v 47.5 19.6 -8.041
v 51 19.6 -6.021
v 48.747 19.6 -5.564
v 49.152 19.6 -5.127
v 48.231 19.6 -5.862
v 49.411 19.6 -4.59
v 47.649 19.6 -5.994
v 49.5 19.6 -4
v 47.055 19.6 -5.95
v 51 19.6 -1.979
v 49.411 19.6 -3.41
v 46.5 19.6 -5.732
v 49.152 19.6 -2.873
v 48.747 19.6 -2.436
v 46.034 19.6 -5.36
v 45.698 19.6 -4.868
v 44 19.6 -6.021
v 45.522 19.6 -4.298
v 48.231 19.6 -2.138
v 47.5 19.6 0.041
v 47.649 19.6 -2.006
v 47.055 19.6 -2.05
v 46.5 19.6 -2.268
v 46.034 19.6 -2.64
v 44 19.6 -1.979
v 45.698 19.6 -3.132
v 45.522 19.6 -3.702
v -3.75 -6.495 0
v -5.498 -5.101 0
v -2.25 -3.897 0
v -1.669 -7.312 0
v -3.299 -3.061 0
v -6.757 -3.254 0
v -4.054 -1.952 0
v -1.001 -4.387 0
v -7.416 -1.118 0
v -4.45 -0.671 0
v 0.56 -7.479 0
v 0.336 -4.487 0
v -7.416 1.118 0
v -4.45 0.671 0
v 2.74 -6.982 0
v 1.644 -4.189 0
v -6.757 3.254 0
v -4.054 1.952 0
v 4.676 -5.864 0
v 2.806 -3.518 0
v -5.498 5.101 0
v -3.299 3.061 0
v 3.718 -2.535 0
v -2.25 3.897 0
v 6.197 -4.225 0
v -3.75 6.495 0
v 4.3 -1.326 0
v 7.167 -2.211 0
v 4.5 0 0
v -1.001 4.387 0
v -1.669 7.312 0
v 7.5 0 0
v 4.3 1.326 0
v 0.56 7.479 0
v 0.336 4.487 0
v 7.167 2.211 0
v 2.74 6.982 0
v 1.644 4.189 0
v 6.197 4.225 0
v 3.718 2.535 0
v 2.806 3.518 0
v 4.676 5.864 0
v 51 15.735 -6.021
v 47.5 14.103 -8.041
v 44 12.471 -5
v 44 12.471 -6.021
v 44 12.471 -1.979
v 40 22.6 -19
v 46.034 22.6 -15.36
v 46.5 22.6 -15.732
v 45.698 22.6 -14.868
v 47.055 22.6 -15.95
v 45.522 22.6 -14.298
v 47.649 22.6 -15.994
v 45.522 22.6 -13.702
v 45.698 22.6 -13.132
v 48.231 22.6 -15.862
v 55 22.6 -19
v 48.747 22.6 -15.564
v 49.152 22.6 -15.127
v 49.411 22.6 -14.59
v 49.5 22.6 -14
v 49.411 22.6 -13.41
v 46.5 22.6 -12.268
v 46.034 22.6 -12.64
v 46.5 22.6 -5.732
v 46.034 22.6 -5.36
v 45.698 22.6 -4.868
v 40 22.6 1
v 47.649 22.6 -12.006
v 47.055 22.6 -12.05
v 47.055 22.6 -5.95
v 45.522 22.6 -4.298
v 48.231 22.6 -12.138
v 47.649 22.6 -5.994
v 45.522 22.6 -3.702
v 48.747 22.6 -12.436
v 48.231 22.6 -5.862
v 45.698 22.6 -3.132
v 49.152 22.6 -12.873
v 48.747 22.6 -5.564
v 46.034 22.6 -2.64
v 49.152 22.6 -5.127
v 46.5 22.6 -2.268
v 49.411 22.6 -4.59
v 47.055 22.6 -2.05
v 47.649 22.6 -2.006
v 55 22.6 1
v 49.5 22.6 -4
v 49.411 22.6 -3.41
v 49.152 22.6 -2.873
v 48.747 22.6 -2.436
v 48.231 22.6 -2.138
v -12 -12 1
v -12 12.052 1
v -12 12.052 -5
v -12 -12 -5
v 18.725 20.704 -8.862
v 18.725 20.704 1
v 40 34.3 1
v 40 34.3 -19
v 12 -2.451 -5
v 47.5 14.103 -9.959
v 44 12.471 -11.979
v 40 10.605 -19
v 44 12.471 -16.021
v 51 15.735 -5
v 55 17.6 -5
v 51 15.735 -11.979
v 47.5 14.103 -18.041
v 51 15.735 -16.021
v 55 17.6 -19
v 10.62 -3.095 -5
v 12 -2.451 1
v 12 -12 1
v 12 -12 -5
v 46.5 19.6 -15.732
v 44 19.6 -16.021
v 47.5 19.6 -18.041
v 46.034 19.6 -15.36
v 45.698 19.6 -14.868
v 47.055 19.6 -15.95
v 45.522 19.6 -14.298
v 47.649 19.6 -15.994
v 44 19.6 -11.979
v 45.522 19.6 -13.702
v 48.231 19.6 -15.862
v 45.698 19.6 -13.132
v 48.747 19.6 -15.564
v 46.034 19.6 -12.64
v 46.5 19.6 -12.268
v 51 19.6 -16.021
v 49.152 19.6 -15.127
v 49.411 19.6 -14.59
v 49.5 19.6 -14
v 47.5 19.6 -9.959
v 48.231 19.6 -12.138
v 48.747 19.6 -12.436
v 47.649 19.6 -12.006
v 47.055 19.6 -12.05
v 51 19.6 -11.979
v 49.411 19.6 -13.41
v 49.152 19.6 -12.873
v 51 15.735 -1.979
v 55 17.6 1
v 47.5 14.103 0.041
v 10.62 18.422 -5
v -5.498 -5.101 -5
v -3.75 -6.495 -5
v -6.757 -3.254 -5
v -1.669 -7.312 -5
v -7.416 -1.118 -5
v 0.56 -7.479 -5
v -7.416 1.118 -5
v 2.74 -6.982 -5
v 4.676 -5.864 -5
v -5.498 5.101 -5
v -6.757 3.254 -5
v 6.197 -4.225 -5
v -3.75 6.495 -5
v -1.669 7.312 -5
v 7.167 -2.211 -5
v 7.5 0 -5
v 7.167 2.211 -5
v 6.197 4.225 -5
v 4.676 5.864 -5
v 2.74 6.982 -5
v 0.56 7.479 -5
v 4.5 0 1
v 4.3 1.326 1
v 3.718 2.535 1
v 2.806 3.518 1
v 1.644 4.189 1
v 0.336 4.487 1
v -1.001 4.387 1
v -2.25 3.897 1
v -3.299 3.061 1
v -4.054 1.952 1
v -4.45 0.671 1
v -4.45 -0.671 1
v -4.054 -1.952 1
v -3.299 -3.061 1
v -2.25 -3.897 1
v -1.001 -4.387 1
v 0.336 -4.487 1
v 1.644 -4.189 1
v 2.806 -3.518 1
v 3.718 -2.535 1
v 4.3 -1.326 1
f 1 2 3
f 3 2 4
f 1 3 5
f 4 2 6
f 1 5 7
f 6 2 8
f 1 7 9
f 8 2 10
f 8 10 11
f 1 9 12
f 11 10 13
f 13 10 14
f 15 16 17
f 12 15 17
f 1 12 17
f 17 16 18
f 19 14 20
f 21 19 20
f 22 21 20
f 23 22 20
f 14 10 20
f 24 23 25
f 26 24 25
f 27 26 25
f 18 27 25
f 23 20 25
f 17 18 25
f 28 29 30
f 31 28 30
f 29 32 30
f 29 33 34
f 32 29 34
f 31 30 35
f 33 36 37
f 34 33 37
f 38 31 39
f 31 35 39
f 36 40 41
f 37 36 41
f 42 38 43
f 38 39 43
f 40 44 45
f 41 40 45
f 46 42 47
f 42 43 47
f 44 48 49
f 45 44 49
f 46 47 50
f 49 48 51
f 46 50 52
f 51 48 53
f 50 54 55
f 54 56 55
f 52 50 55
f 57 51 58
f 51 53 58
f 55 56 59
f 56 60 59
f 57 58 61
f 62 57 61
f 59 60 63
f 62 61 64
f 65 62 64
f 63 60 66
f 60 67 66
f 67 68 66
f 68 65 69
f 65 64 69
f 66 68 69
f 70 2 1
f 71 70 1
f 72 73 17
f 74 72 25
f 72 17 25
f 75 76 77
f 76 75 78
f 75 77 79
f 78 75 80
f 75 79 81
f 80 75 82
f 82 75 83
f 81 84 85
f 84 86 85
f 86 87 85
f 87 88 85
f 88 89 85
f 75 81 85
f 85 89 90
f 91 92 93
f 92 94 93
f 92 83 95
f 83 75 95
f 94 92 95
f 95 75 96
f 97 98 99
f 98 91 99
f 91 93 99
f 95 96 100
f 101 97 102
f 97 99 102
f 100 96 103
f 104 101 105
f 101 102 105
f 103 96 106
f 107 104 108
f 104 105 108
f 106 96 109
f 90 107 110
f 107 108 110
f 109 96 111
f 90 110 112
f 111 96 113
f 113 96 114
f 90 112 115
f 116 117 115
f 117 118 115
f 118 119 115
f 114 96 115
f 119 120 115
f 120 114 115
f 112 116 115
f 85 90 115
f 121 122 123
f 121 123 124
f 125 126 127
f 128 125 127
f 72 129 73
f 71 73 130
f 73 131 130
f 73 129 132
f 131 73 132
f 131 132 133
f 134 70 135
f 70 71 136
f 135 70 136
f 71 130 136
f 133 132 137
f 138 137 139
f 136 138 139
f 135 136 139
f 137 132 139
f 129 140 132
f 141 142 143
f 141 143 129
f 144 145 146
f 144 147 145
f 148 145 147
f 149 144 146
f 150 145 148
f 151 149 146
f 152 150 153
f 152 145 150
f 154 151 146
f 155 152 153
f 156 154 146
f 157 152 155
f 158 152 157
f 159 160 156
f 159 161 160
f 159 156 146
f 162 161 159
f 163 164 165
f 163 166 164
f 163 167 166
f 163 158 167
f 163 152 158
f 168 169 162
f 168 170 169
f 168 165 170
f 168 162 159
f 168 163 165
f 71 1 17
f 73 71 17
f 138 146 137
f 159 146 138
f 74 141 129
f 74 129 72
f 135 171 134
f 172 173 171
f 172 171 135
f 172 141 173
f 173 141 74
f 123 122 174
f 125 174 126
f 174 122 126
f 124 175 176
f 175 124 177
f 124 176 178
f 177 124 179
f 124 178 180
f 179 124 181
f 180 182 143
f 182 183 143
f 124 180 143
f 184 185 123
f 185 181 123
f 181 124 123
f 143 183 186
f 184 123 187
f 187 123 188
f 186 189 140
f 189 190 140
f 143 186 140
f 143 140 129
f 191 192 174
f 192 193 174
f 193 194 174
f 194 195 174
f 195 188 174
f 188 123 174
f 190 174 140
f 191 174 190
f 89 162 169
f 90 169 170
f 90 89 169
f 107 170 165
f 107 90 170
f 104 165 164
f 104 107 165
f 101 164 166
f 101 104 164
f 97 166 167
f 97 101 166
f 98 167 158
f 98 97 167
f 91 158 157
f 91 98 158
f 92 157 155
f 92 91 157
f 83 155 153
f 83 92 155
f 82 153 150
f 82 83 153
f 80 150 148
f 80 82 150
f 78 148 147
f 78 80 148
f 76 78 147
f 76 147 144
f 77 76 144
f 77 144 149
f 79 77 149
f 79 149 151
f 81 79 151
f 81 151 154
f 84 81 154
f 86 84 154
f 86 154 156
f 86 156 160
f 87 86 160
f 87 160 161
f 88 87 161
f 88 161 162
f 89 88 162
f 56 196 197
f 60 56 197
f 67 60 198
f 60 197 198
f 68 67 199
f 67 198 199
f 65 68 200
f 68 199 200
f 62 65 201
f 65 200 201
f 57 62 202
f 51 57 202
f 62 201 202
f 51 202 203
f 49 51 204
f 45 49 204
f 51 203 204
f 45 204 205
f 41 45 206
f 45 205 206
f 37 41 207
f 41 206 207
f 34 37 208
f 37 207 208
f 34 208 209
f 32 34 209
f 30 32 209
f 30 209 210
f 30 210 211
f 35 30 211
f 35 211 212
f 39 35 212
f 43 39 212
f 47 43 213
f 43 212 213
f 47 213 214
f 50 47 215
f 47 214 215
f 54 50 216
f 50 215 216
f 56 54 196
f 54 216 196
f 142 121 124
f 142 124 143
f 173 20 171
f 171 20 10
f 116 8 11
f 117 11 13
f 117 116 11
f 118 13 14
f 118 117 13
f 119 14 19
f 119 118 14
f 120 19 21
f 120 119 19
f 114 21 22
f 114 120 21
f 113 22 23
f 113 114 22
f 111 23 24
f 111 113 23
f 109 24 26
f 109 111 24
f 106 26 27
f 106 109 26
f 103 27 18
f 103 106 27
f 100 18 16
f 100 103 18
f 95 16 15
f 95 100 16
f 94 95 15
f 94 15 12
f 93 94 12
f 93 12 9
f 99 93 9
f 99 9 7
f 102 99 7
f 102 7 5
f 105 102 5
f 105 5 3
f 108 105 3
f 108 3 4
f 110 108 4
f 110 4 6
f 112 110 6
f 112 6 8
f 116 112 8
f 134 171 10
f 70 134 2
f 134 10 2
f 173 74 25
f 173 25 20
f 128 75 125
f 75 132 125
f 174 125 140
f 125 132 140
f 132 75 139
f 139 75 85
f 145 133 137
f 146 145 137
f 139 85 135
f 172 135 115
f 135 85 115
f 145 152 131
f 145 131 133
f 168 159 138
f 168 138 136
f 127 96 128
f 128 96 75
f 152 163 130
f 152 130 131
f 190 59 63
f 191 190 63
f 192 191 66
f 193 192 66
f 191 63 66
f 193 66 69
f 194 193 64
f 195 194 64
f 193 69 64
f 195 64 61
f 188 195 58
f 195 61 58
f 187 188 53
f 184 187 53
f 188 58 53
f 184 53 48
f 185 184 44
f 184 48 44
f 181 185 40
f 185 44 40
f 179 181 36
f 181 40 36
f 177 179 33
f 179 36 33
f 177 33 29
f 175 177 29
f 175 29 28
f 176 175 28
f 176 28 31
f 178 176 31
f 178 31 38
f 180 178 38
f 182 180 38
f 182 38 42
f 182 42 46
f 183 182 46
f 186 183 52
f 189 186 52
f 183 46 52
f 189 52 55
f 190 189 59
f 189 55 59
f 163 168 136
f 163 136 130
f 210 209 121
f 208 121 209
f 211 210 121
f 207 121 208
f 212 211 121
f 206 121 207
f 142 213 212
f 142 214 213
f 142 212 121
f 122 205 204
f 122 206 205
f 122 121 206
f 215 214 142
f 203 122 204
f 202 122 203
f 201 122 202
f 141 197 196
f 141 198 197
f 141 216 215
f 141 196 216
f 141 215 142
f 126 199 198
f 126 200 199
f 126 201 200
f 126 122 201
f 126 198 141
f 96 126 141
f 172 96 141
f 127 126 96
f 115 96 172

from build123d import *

# Parameters (mm, degrees)
SKETCH1_R           = 10
SKETCH1_R_2         = 7.5
BOSS_EXTRUDE1_DEPTH = 5
BOSS_EXTRUDE2_START = 1
SKETCH1_3_R         = 10
SKETCH1_3_R_2       = 7.5
SKETCH1_3_R_3       = 4.5
BOSS_EXTRUDE2_DEPTH = 1
SKETCH2_R           = 10
BOSS_EXTRUDE3_DEPTH = 6
BOSS_EXTRUDE7_REACH = 67.17
SKETCH3_W           = 15
SKETCH3_H           = 14
SKETCH4_R           = 2
CUT_EXTRUDE4_DEPTH  = 68.699039875
CUT_EXTRUDE5_START  = 3
SKETCH4_3_R         = 2
CUT_EXTRUDE5_DEPTH  = 65.699039875
BOSS_EXTRUDE8_REACH = 69.699
CUT_EXTRUDE6_DEPTH  = 69.867191027


with BuildPart() as part:
    # Sketch1 → Boss-Extrude1 (new body)
    with BuildSketch(Plane.XY):
        Circle(SKETCH1_R)
        Circle(SKETCH1_R_2, mode=Mode.SUBTRACT)
    extrude(amount=-BOSS_EXTRUDE1_DEPTH)

    # Sketch1<3> → Boss-Extrude2 (add)
    # profile 1 of 2: a face of its own
    with BuildSketch(Plane.XY.offset(BOSS_EXTRUDE2_START)):
        Circle(SKETCH1_3_R)
        Circle(SKETCH1_3_R_2, mode=Mode.SUBTRACT)
    # profile 2 of 2: a face of its own
    with BuildSketch(Plane.XY.offset(BOSS_EXTRUDE2_START)):
        Circle(SKETCH1_3_R_2)
        Circle(SKETCH1_3_R_3, mode=Mode.SUBTRACT)
    extrude(amount=-BOSS_EXTRUDE2_DEPTH)

    # Sketch2 → Boss-Extrude3 (add)
    with BuildSketch(Plane.XY.offset(1)):
        Polygon((55, 17.6), (55, 22.6), (40, 22.6), (40, 36.3), (-12, 12.052001776), (-12, -12), (12, -12), (12, -2.451229301), align=None)
        Circle(SKETCH2_R, mode=Mode.SUBTRACT)
    extrude(amount=-BOSS_EXTRUDE3_DEPTH)

    # Boss-Extrude7: up to this plane
    boss_extrude7_end = Plane(origin=(3.082149634, -6.609691221, -87.594733488), z_dir=(-0.42261826174069755, 0.9063077870366509, 0))
    # Sketch3 → Boss-Extrude7 (add, up to the surface)
    with BuildSketch(Plane.XZ.offset(-22.6), mode=Mode.PRIVATE) as boss_extrude7_sk1:
        Polygon((40, -5), (40, -19), (10.620255189, -5), align=None)
    boss_extrude7_tool1 = split(extrude(boss_extrude7_sk1.sketch, amount=BOSS_EXTRUDE7_REACH, mode=Mode.PRIVATE), bisect_by=boss_extrude7_end, keep=Keep.BOTH, mode=Mode.PRIVATE)
    add(boss_extrude7_tool1.solids().sort_by_distance((30.206752, 22.6, -9.666667))[0])
    # Sketch3 → Boss-Extrude7 (add, up to the surface)
    with BuildSketch(Plane.XZ.offset(-22.6), mode=Mode.PRIVATE) as boss_extrude7_sk2:
        with Locations((47.5, -12)):
            Rectangle(SKETCH3_W, SKETCH3_H)
    boss_extrude7_tool2 = split(extrude(boss_extrude7_sk2.sketch, amount=BOSS_EXTRUDE7_REACH, mode=Mode.PRIVATE), bisect_by=boss_extrude7_end, keep=Keep.BOTH, mode=Mode.PRIVATE)
    add(boss_extrude7_tool2.solids().sort_by_distance((47.5, 22.6, -12))[0])

    # Sketch4 → Cut-Extrude4 (cut, through all)
    with BuildSketch(Plane.XZ.offset(-22.6)):
        with Locations((47.5, -14)):
            Circle(SKETCH4_R)
        with Locations((47.5, -4)):
            Circle(SKETCH4_R)
    extrude(amount=CUT_EXTRUDE4_DEPTH, mode=Mode.SUBTRACT)

    # Sketch4<3> → Cut-Extrude5 (cut, through all)
    # profile 1 of 2: a face of its own
    with BuildSketch(Plane.XZ.offset(-22.6).offset(CUT_EXTRUDE5_START)):
        Polygon((47.5, -8.041451884), (44, -6.020725942), (44, -1.979274058), (47.5, 0.041451884), (51, -1.979274058), (51, -6.020725942), align=None)
        with Locations(Location((47.5, -4, 0), (0, 0, 90))):
            Circle(SKETCH4_3_R, mode=Mode.SUBTRACT)
    # profile 2 of 2: a face of its own
    with BuildSketch(Plane.XZ.offset(-22.6).offset(CUT_EXTRUDE5_START)):
        Polygon((51, -16.020725942), (51, -11.979274058), (47.5, -9.958548116), (44, -11.979274058), (44, -16.020725942), (47.5, -18.041451884), align=None)
        with Locations(Location((47.5, -14, 0), (0, 0, 90))):
            Circle(SKETCH4_3_R, mode=Mode.SUBTRACT)
    extrude(amount=CUT_EXTRUDE5_DEPTH, mode=Mode.SUBTRACT)

    # Boss-Extrude8: up to this face of the body (flat: up to its plane)
    boss_extrude8_end = Plane(part.part.faces().sort_by_distance((14, 24.176000888, -2))[0])
    # Sketch3<4> → Boss-Extrude8 (add, up to the picked face)
    with BuildSketch(Plane.XZ.offset(-22.6), mode=Mode.PRIVATE) as boss_extrude8_sk1:
        Polygon((40, -5), (40, -19), (10.620255189, -5), align=None)
    boss_extrude8_tool1 = split(extrude(boss_extrude8_sk1.sketch, amount=-BOSS_EXTRUDE8_REACH, mode=Mode.PRIVATE), bisect_by=boss_extrude8_end, keep=Keep.BOTH, mode=Mode.PRIVATE)
    add(boss_extrude8_tool1.solids().sort_by(Axis((30.206752, 22.6, -9.666667), (0, 1, 0)))[0])

    # Sketch6 → Cut-Extrude6 (cut, through all)
    with BuildSketch(Plane.XY.offset(1)):
        Polygon((-12, 12.052001776), (18.725283831, 20.703901024), (15.930931538, 25.076409051), align=None)
        Polygon((15.930931538, 25.076409051), (18.725283831, 20.703901024), (40, 34.3), (40, 36.3), align=None)
    extrude(amount=-CUT_EXTRUDE6_DEPTH, mode=Mode.SUBTRACT)


solid = part.part
